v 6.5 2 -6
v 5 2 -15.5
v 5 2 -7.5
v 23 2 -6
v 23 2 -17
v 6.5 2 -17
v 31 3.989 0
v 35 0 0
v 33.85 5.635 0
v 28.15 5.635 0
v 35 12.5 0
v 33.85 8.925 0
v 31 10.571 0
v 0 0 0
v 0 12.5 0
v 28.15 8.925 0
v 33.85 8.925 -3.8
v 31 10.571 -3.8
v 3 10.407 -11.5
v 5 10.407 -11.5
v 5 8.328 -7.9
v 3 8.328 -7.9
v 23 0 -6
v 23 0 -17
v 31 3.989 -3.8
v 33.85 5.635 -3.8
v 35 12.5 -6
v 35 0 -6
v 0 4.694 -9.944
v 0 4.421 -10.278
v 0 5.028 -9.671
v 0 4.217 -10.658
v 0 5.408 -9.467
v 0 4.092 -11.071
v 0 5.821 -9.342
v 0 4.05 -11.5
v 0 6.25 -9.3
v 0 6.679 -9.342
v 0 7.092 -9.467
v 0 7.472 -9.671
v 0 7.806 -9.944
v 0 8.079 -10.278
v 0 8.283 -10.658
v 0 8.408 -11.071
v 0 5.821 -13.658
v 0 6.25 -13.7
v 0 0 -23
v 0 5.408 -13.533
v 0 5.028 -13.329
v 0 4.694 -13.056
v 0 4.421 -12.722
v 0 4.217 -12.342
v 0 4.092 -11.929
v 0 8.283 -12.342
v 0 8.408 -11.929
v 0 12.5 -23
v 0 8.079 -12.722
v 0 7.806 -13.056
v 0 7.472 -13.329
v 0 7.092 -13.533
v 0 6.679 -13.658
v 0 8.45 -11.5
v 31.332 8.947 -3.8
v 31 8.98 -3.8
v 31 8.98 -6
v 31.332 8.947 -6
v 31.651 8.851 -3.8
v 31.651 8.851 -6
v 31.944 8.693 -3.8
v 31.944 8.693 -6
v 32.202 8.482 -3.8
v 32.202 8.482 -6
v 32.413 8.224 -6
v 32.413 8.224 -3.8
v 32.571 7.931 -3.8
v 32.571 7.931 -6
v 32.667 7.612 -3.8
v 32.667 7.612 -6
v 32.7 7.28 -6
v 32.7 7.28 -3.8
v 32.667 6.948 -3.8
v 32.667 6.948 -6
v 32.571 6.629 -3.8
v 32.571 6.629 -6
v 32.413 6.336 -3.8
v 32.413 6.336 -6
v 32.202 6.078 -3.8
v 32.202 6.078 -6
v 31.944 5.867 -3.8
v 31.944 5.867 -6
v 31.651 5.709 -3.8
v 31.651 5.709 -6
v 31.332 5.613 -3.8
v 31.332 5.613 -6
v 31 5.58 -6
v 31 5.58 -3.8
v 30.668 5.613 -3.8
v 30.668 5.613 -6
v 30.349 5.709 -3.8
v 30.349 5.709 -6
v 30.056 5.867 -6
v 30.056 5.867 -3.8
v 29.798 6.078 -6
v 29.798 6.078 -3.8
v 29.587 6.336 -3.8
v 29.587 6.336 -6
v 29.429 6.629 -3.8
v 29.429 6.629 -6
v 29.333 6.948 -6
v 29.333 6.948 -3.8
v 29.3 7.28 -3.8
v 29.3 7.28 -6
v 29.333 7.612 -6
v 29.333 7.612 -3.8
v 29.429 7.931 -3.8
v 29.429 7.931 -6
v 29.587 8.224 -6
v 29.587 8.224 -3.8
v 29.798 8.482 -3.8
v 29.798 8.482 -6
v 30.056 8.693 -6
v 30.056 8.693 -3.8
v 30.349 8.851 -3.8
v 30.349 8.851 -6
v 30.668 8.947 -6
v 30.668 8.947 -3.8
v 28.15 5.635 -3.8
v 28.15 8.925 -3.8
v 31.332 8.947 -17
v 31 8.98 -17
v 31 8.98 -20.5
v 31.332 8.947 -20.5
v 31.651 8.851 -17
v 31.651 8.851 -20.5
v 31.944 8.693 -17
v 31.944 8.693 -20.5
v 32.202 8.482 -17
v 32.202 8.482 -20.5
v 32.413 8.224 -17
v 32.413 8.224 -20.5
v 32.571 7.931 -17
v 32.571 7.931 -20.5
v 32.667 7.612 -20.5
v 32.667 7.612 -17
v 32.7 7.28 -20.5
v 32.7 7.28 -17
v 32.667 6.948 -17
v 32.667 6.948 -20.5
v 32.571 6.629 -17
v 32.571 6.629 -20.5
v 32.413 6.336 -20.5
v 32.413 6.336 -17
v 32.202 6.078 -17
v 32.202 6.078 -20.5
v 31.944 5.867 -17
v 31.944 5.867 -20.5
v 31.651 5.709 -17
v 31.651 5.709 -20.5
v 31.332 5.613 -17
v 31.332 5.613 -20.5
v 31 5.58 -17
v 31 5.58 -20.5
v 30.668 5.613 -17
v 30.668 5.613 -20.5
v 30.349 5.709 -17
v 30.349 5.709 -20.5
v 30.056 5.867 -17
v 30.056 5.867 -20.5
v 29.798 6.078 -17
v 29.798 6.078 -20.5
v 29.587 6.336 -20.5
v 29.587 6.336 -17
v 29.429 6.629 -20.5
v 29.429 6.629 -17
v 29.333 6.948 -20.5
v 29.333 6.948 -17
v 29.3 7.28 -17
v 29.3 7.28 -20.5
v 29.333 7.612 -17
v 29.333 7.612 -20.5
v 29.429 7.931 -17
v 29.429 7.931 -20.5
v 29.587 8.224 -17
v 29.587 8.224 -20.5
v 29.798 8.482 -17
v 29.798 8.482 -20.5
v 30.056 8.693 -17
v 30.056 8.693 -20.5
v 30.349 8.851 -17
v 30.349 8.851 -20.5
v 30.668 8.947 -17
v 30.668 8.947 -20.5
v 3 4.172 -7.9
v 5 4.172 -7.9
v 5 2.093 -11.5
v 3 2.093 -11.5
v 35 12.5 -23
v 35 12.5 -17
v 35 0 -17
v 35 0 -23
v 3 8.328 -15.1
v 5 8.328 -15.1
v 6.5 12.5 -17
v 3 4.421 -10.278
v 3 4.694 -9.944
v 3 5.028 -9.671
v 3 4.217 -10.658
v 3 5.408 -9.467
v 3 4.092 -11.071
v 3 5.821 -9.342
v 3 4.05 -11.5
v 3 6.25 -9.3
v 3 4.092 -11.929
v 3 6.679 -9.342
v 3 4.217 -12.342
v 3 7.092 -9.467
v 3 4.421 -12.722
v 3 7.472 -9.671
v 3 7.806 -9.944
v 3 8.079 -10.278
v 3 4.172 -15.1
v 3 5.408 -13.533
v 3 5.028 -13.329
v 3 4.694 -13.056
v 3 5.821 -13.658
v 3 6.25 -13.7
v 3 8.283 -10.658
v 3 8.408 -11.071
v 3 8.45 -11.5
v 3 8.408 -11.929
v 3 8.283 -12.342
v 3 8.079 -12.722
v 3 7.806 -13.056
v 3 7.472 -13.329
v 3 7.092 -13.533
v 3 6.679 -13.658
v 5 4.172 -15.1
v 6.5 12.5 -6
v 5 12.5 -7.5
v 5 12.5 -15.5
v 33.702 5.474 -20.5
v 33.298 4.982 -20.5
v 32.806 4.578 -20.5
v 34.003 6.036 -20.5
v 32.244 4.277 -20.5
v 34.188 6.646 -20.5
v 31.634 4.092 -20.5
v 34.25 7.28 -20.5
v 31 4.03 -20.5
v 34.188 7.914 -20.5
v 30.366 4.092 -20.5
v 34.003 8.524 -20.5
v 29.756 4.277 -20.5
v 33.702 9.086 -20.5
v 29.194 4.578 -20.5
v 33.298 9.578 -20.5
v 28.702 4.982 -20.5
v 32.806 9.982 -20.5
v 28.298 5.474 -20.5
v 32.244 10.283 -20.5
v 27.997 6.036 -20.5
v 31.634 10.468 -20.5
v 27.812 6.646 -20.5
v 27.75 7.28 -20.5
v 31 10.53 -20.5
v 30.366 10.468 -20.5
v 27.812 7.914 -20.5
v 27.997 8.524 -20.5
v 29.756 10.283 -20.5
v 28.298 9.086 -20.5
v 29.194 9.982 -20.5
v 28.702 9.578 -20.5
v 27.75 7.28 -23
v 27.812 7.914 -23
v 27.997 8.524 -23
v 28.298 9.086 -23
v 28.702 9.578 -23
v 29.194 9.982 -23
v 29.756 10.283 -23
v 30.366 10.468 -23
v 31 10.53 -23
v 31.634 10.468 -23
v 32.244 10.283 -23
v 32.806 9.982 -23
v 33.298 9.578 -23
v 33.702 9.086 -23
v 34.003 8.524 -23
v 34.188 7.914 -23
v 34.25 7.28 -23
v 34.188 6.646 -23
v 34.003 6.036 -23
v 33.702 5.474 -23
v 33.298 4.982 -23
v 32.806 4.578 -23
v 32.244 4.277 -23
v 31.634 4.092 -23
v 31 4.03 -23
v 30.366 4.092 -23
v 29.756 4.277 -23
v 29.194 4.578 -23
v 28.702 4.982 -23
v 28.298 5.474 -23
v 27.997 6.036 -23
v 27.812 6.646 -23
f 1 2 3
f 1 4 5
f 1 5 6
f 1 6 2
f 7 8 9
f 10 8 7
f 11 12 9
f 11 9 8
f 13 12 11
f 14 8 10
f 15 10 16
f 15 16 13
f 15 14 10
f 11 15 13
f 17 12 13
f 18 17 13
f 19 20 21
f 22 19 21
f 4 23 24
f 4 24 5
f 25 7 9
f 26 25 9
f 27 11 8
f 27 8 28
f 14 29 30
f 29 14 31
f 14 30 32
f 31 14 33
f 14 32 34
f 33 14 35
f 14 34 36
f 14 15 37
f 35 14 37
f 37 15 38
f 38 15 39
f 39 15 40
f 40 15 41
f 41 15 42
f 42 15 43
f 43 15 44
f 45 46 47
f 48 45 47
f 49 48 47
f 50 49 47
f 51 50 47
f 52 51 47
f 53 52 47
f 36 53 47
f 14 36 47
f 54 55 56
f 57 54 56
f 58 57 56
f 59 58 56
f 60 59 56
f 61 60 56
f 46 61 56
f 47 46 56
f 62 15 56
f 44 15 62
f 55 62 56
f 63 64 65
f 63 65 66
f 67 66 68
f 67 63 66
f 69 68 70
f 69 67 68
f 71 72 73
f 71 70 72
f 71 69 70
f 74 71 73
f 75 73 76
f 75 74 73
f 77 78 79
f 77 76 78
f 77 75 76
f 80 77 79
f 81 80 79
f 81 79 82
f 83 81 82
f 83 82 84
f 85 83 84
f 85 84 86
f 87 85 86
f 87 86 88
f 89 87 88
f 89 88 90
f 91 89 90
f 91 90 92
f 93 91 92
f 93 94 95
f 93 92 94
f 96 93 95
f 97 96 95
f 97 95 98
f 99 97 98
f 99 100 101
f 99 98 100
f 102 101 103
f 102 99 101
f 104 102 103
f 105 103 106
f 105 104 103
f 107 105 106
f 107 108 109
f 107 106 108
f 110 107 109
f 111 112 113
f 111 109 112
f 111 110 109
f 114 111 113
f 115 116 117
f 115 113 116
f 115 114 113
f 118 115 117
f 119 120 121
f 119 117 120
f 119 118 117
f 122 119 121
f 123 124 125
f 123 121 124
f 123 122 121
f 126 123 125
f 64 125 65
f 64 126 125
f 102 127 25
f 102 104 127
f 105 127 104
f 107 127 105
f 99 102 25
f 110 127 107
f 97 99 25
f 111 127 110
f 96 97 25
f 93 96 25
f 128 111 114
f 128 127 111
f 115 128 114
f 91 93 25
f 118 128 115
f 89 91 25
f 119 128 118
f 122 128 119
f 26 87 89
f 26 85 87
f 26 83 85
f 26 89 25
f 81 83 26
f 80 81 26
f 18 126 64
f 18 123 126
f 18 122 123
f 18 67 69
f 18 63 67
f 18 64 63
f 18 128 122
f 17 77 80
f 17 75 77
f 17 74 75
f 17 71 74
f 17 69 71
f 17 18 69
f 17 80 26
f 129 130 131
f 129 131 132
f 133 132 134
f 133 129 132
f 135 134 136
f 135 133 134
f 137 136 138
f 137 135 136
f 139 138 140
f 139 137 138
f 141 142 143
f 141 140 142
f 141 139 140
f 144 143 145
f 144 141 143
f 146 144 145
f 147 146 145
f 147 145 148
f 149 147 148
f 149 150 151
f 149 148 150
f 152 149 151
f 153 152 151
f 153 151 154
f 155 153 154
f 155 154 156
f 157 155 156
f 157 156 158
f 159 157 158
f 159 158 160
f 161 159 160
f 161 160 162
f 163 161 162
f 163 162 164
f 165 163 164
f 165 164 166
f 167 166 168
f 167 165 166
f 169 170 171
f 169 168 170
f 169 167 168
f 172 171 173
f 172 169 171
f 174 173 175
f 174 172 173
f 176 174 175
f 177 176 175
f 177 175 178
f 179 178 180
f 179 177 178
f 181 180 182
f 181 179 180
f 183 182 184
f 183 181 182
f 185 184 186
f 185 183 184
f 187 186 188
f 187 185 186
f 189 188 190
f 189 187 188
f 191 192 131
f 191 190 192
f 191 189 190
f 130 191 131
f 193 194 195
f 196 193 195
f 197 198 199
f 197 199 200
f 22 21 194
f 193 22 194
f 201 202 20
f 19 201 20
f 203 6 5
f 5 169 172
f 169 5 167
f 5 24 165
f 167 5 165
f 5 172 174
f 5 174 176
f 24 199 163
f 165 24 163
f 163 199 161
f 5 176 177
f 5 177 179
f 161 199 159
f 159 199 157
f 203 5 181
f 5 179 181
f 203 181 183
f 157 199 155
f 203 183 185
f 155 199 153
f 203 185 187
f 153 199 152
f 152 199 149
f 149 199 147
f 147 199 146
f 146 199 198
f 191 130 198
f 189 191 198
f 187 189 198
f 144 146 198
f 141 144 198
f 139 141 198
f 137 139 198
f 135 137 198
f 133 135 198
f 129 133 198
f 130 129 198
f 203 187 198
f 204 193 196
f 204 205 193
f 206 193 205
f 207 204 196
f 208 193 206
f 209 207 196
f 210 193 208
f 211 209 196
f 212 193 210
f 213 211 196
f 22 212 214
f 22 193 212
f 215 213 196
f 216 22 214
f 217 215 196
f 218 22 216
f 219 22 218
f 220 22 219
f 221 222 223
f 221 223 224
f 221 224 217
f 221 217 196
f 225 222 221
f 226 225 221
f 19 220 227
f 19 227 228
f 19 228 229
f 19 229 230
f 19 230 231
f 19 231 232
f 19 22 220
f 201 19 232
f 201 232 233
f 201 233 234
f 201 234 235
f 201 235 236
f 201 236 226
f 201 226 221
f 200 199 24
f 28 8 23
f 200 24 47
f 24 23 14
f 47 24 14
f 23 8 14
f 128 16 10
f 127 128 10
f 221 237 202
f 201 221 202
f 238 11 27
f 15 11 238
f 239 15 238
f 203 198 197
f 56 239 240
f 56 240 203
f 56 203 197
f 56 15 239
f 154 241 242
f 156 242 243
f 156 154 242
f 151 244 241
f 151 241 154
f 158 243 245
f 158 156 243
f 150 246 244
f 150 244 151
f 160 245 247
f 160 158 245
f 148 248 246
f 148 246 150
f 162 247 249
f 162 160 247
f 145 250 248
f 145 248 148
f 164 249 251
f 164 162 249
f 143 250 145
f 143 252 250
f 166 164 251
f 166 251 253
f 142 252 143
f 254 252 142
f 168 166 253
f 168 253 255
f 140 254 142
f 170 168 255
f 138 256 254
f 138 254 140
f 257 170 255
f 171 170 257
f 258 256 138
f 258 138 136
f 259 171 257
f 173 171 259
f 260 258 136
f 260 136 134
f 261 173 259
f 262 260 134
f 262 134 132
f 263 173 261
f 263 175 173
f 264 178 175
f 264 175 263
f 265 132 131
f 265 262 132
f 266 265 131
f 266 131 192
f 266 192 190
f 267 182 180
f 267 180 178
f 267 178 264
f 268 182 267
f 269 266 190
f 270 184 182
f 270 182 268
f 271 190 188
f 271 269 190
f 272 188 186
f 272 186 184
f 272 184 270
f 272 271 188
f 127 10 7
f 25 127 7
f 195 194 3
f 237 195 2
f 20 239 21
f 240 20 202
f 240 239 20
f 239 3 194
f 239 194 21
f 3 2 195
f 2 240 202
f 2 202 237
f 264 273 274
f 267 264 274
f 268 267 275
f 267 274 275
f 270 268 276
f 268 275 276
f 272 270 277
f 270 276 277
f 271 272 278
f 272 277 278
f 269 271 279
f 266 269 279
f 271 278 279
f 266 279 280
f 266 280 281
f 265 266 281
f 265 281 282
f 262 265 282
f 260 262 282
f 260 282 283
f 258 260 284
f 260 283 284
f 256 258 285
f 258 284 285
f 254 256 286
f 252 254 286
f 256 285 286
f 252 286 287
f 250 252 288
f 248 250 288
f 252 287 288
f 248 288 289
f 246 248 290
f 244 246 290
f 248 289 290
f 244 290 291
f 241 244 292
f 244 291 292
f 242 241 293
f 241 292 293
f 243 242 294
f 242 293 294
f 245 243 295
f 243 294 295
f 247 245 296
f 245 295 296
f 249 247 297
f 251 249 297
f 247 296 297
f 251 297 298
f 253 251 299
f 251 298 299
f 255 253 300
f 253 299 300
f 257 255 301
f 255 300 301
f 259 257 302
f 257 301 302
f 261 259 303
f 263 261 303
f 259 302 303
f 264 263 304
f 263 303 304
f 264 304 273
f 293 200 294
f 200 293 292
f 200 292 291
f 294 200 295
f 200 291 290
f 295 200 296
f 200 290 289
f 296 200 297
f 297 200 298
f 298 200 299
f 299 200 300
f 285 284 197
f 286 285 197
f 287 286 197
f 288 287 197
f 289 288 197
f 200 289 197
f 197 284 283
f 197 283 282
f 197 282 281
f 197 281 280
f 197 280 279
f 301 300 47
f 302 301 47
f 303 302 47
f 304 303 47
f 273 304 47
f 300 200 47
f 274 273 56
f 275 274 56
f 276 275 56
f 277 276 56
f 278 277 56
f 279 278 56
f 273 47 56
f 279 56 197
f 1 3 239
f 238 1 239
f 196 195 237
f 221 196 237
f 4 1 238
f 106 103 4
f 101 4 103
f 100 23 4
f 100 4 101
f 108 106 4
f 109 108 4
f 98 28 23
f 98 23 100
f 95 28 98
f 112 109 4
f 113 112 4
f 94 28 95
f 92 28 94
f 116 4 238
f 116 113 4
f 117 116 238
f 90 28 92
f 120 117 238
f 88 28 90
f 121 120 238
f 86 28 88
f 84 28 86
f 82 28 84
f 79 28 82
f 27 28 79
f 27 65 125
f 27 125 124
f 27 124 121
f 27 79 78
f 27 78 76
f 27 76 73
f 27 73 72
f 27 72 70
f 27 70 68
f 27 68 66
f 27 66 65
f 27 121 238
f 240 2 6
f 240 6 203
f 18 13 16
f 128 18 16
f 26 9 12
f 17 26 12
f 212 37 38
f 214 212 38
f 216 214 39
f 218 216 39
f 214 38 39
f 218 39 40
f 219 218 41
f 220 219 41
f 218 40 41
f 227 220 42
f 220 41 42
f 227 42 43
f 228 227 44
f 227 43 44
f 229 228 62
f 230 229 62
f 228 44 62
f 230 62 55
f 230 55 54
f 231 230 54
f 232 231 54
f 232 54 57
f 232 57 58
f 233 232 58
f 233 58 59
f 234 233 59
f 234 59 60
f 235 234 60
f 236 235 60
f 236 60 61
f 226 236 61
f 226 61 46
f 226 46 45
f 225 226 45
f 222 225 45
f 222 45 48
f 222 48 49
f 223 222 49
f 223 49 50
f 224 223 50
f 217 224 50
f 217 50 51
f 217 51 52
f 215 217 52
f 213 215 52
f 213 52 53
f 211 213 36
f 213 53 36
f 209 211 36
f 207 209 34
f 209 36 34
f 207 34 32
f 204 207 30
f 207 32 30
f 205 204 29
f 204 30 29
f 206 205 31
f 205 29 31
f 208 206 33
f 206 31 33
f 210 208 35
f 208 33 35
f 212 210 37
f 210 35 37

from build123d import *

# Parameters (mm, degrees)
SKETCH1_W               = 23
SKETCH1_H               = 12.5
BOSS_EXTRUDE1_DEPTH     = 35
SKETCH2_W               = 11
SKETCH2_H               = 12.5
CUT_EXTRUDE1_DEPTH      = 30
CUT_EXTRUDE2_DEPTH      = 44.706406853
CUT_EXTRUDE2_DEPTH_BACK = 44.706406853
SKETCH3_R               = 1.7
SKETCH4_R               = 2.2
CUT_EXTRUDE3_DEPTH      = 10
CUT_EXTRUDE4_DEPTH      = 2
SKETCH6_R               = 3.25
CUT_EXTRUDE5_DEPTH      = 2.5
CUT_EXTRUDE6_DEPTH      = 3.8
SKETCH8_W               = 18
SKETCH8_H               = 2
BOSS_EXTRUDE2_DEPTH     = 11
CHAMFER2_SIZE           = 1.5


with BuildPart() as part:
    # Sketch1 → Boss-Extrude1 (new body)
    with BuildSketch(Plane(origin=(0, 0, 0), x_dir=(0, 0, -1), z_dir=(1, 0, 0))):
        with Locations((11.5, 6.25)):
            Rectangle(SKETCH1_W, SKETCH1_H)
    extrude(amount=BOSS_EXTRUDE1_DEPTH)

    # Sketch2 → Cut-Extrude1 (cut)
    with BuildSketch(Plane(origin=(35, 0, 0), x_dir=(0, 0, -1), z_dir=(1, 0, 0))):
        with Locations((11.5, 6.25)):
            Rectangle(SKETCH2_W, SKETCH2_H)
    extrude(amount=-CUT_EXTRUDE1_DEPTH, mode=Mode.SUBTRACT)

    # Sketch3 → Cut-Extrude2 (cut, two sides: drawn at the far end of the back side and taken through both)
    with BuildSketch(Plane(origin=(0, 0, -23), x_dir=(-1, 0, 0), z_dir=(0, 0, -1)).offset(-CUT_EXTRUDE2_DEPTH_BACK)):
        with Locations(Location((-31, 7.28, 0), (0, 0, 90))):
            Circle(SKETCH3_R)
    extrude(amount=CUT_EXTRUDE2_DEPTH + CUT_EXTRUDE2_DEPTH_BACK, mode=Mode.SUBTRACT)

    # Sketch4 → Cut-Extrude3 (cut)
    with BuildSketch(Plane.ZY):
        with Locations((-11.5, 6.25)):
            Circle(SKETCH4_R)
    extrude(amount=-CUT_EXTRUDE3_DEPTH, mode=Mode.SUBTRACT)

    # Sketch5 → Cut-Extrude4 (cut)
    with BuildSketch(Plane(origin=(5, 0, 0), x_dir=(0, 0, -1), z_dir=(1, 0, 0))):
        Polygon((7.9, 8.328460969), (7.9, 4.171539031), (11.5, 2.093078062), (15.1, 4.171539031), (15.1, 8.328460969), (11.5, 10.406921938), align=None)
    extrude(amount=-CUT_EXTRUDE4_DEPTH, mode=Mode.SUBTRACT)

    # Sketch6 → Cut-Extrude5 (cut)
    with BuildSketch(Plane(origin=(0, 0, -23), x_dir=(-1, 0, 0), z_dir=(0, 0, -1))):
        with Locations((-31, 7.28)):
            Circle(SKETCH6_R)
    extrude(amount=-CUT_EXTRUDE5_DEPTH, mode=Mode.SUBTRACT)

    # Sketch7 → Cut-Extrude6 (cut)
    with BuildSketch(Plane.XY):
        Polygon((28.15, 8.925448267), (28.15, 5.634551733), (31, 3.989103466), (33.85, 5.634551733), (33.85, 8.925448267), (31, 10.570896534), align=None)
    extrude(amount=-CUT_EXTRUDE6_DEPTH, mode=Mode.SUBTRACT)

    # Sketch8 → Boss-Extrude2 (add)
    with BuildSketch(Plane(origin=(0, 0, -6), x_dir=(-1, 0, 0), z_dir=(0, 0, -1))):
        with Locations((-14, 1)):
            Rectangle(SKETCH8_W, SKETCH8_H)
    extrude(amount=BOSS_EXTRUDE2_DEPTH)

    # Chamfer2
    chamfer2_edges = [part.edges().sort_by_distance(p)[0] for p in [
        (5, 7.25, -6),
        (5, 7.25, -17),
    ]]
    chamfer(chamfer2_edges, length=CHAMFER2_SIZE)


solid = part.part
